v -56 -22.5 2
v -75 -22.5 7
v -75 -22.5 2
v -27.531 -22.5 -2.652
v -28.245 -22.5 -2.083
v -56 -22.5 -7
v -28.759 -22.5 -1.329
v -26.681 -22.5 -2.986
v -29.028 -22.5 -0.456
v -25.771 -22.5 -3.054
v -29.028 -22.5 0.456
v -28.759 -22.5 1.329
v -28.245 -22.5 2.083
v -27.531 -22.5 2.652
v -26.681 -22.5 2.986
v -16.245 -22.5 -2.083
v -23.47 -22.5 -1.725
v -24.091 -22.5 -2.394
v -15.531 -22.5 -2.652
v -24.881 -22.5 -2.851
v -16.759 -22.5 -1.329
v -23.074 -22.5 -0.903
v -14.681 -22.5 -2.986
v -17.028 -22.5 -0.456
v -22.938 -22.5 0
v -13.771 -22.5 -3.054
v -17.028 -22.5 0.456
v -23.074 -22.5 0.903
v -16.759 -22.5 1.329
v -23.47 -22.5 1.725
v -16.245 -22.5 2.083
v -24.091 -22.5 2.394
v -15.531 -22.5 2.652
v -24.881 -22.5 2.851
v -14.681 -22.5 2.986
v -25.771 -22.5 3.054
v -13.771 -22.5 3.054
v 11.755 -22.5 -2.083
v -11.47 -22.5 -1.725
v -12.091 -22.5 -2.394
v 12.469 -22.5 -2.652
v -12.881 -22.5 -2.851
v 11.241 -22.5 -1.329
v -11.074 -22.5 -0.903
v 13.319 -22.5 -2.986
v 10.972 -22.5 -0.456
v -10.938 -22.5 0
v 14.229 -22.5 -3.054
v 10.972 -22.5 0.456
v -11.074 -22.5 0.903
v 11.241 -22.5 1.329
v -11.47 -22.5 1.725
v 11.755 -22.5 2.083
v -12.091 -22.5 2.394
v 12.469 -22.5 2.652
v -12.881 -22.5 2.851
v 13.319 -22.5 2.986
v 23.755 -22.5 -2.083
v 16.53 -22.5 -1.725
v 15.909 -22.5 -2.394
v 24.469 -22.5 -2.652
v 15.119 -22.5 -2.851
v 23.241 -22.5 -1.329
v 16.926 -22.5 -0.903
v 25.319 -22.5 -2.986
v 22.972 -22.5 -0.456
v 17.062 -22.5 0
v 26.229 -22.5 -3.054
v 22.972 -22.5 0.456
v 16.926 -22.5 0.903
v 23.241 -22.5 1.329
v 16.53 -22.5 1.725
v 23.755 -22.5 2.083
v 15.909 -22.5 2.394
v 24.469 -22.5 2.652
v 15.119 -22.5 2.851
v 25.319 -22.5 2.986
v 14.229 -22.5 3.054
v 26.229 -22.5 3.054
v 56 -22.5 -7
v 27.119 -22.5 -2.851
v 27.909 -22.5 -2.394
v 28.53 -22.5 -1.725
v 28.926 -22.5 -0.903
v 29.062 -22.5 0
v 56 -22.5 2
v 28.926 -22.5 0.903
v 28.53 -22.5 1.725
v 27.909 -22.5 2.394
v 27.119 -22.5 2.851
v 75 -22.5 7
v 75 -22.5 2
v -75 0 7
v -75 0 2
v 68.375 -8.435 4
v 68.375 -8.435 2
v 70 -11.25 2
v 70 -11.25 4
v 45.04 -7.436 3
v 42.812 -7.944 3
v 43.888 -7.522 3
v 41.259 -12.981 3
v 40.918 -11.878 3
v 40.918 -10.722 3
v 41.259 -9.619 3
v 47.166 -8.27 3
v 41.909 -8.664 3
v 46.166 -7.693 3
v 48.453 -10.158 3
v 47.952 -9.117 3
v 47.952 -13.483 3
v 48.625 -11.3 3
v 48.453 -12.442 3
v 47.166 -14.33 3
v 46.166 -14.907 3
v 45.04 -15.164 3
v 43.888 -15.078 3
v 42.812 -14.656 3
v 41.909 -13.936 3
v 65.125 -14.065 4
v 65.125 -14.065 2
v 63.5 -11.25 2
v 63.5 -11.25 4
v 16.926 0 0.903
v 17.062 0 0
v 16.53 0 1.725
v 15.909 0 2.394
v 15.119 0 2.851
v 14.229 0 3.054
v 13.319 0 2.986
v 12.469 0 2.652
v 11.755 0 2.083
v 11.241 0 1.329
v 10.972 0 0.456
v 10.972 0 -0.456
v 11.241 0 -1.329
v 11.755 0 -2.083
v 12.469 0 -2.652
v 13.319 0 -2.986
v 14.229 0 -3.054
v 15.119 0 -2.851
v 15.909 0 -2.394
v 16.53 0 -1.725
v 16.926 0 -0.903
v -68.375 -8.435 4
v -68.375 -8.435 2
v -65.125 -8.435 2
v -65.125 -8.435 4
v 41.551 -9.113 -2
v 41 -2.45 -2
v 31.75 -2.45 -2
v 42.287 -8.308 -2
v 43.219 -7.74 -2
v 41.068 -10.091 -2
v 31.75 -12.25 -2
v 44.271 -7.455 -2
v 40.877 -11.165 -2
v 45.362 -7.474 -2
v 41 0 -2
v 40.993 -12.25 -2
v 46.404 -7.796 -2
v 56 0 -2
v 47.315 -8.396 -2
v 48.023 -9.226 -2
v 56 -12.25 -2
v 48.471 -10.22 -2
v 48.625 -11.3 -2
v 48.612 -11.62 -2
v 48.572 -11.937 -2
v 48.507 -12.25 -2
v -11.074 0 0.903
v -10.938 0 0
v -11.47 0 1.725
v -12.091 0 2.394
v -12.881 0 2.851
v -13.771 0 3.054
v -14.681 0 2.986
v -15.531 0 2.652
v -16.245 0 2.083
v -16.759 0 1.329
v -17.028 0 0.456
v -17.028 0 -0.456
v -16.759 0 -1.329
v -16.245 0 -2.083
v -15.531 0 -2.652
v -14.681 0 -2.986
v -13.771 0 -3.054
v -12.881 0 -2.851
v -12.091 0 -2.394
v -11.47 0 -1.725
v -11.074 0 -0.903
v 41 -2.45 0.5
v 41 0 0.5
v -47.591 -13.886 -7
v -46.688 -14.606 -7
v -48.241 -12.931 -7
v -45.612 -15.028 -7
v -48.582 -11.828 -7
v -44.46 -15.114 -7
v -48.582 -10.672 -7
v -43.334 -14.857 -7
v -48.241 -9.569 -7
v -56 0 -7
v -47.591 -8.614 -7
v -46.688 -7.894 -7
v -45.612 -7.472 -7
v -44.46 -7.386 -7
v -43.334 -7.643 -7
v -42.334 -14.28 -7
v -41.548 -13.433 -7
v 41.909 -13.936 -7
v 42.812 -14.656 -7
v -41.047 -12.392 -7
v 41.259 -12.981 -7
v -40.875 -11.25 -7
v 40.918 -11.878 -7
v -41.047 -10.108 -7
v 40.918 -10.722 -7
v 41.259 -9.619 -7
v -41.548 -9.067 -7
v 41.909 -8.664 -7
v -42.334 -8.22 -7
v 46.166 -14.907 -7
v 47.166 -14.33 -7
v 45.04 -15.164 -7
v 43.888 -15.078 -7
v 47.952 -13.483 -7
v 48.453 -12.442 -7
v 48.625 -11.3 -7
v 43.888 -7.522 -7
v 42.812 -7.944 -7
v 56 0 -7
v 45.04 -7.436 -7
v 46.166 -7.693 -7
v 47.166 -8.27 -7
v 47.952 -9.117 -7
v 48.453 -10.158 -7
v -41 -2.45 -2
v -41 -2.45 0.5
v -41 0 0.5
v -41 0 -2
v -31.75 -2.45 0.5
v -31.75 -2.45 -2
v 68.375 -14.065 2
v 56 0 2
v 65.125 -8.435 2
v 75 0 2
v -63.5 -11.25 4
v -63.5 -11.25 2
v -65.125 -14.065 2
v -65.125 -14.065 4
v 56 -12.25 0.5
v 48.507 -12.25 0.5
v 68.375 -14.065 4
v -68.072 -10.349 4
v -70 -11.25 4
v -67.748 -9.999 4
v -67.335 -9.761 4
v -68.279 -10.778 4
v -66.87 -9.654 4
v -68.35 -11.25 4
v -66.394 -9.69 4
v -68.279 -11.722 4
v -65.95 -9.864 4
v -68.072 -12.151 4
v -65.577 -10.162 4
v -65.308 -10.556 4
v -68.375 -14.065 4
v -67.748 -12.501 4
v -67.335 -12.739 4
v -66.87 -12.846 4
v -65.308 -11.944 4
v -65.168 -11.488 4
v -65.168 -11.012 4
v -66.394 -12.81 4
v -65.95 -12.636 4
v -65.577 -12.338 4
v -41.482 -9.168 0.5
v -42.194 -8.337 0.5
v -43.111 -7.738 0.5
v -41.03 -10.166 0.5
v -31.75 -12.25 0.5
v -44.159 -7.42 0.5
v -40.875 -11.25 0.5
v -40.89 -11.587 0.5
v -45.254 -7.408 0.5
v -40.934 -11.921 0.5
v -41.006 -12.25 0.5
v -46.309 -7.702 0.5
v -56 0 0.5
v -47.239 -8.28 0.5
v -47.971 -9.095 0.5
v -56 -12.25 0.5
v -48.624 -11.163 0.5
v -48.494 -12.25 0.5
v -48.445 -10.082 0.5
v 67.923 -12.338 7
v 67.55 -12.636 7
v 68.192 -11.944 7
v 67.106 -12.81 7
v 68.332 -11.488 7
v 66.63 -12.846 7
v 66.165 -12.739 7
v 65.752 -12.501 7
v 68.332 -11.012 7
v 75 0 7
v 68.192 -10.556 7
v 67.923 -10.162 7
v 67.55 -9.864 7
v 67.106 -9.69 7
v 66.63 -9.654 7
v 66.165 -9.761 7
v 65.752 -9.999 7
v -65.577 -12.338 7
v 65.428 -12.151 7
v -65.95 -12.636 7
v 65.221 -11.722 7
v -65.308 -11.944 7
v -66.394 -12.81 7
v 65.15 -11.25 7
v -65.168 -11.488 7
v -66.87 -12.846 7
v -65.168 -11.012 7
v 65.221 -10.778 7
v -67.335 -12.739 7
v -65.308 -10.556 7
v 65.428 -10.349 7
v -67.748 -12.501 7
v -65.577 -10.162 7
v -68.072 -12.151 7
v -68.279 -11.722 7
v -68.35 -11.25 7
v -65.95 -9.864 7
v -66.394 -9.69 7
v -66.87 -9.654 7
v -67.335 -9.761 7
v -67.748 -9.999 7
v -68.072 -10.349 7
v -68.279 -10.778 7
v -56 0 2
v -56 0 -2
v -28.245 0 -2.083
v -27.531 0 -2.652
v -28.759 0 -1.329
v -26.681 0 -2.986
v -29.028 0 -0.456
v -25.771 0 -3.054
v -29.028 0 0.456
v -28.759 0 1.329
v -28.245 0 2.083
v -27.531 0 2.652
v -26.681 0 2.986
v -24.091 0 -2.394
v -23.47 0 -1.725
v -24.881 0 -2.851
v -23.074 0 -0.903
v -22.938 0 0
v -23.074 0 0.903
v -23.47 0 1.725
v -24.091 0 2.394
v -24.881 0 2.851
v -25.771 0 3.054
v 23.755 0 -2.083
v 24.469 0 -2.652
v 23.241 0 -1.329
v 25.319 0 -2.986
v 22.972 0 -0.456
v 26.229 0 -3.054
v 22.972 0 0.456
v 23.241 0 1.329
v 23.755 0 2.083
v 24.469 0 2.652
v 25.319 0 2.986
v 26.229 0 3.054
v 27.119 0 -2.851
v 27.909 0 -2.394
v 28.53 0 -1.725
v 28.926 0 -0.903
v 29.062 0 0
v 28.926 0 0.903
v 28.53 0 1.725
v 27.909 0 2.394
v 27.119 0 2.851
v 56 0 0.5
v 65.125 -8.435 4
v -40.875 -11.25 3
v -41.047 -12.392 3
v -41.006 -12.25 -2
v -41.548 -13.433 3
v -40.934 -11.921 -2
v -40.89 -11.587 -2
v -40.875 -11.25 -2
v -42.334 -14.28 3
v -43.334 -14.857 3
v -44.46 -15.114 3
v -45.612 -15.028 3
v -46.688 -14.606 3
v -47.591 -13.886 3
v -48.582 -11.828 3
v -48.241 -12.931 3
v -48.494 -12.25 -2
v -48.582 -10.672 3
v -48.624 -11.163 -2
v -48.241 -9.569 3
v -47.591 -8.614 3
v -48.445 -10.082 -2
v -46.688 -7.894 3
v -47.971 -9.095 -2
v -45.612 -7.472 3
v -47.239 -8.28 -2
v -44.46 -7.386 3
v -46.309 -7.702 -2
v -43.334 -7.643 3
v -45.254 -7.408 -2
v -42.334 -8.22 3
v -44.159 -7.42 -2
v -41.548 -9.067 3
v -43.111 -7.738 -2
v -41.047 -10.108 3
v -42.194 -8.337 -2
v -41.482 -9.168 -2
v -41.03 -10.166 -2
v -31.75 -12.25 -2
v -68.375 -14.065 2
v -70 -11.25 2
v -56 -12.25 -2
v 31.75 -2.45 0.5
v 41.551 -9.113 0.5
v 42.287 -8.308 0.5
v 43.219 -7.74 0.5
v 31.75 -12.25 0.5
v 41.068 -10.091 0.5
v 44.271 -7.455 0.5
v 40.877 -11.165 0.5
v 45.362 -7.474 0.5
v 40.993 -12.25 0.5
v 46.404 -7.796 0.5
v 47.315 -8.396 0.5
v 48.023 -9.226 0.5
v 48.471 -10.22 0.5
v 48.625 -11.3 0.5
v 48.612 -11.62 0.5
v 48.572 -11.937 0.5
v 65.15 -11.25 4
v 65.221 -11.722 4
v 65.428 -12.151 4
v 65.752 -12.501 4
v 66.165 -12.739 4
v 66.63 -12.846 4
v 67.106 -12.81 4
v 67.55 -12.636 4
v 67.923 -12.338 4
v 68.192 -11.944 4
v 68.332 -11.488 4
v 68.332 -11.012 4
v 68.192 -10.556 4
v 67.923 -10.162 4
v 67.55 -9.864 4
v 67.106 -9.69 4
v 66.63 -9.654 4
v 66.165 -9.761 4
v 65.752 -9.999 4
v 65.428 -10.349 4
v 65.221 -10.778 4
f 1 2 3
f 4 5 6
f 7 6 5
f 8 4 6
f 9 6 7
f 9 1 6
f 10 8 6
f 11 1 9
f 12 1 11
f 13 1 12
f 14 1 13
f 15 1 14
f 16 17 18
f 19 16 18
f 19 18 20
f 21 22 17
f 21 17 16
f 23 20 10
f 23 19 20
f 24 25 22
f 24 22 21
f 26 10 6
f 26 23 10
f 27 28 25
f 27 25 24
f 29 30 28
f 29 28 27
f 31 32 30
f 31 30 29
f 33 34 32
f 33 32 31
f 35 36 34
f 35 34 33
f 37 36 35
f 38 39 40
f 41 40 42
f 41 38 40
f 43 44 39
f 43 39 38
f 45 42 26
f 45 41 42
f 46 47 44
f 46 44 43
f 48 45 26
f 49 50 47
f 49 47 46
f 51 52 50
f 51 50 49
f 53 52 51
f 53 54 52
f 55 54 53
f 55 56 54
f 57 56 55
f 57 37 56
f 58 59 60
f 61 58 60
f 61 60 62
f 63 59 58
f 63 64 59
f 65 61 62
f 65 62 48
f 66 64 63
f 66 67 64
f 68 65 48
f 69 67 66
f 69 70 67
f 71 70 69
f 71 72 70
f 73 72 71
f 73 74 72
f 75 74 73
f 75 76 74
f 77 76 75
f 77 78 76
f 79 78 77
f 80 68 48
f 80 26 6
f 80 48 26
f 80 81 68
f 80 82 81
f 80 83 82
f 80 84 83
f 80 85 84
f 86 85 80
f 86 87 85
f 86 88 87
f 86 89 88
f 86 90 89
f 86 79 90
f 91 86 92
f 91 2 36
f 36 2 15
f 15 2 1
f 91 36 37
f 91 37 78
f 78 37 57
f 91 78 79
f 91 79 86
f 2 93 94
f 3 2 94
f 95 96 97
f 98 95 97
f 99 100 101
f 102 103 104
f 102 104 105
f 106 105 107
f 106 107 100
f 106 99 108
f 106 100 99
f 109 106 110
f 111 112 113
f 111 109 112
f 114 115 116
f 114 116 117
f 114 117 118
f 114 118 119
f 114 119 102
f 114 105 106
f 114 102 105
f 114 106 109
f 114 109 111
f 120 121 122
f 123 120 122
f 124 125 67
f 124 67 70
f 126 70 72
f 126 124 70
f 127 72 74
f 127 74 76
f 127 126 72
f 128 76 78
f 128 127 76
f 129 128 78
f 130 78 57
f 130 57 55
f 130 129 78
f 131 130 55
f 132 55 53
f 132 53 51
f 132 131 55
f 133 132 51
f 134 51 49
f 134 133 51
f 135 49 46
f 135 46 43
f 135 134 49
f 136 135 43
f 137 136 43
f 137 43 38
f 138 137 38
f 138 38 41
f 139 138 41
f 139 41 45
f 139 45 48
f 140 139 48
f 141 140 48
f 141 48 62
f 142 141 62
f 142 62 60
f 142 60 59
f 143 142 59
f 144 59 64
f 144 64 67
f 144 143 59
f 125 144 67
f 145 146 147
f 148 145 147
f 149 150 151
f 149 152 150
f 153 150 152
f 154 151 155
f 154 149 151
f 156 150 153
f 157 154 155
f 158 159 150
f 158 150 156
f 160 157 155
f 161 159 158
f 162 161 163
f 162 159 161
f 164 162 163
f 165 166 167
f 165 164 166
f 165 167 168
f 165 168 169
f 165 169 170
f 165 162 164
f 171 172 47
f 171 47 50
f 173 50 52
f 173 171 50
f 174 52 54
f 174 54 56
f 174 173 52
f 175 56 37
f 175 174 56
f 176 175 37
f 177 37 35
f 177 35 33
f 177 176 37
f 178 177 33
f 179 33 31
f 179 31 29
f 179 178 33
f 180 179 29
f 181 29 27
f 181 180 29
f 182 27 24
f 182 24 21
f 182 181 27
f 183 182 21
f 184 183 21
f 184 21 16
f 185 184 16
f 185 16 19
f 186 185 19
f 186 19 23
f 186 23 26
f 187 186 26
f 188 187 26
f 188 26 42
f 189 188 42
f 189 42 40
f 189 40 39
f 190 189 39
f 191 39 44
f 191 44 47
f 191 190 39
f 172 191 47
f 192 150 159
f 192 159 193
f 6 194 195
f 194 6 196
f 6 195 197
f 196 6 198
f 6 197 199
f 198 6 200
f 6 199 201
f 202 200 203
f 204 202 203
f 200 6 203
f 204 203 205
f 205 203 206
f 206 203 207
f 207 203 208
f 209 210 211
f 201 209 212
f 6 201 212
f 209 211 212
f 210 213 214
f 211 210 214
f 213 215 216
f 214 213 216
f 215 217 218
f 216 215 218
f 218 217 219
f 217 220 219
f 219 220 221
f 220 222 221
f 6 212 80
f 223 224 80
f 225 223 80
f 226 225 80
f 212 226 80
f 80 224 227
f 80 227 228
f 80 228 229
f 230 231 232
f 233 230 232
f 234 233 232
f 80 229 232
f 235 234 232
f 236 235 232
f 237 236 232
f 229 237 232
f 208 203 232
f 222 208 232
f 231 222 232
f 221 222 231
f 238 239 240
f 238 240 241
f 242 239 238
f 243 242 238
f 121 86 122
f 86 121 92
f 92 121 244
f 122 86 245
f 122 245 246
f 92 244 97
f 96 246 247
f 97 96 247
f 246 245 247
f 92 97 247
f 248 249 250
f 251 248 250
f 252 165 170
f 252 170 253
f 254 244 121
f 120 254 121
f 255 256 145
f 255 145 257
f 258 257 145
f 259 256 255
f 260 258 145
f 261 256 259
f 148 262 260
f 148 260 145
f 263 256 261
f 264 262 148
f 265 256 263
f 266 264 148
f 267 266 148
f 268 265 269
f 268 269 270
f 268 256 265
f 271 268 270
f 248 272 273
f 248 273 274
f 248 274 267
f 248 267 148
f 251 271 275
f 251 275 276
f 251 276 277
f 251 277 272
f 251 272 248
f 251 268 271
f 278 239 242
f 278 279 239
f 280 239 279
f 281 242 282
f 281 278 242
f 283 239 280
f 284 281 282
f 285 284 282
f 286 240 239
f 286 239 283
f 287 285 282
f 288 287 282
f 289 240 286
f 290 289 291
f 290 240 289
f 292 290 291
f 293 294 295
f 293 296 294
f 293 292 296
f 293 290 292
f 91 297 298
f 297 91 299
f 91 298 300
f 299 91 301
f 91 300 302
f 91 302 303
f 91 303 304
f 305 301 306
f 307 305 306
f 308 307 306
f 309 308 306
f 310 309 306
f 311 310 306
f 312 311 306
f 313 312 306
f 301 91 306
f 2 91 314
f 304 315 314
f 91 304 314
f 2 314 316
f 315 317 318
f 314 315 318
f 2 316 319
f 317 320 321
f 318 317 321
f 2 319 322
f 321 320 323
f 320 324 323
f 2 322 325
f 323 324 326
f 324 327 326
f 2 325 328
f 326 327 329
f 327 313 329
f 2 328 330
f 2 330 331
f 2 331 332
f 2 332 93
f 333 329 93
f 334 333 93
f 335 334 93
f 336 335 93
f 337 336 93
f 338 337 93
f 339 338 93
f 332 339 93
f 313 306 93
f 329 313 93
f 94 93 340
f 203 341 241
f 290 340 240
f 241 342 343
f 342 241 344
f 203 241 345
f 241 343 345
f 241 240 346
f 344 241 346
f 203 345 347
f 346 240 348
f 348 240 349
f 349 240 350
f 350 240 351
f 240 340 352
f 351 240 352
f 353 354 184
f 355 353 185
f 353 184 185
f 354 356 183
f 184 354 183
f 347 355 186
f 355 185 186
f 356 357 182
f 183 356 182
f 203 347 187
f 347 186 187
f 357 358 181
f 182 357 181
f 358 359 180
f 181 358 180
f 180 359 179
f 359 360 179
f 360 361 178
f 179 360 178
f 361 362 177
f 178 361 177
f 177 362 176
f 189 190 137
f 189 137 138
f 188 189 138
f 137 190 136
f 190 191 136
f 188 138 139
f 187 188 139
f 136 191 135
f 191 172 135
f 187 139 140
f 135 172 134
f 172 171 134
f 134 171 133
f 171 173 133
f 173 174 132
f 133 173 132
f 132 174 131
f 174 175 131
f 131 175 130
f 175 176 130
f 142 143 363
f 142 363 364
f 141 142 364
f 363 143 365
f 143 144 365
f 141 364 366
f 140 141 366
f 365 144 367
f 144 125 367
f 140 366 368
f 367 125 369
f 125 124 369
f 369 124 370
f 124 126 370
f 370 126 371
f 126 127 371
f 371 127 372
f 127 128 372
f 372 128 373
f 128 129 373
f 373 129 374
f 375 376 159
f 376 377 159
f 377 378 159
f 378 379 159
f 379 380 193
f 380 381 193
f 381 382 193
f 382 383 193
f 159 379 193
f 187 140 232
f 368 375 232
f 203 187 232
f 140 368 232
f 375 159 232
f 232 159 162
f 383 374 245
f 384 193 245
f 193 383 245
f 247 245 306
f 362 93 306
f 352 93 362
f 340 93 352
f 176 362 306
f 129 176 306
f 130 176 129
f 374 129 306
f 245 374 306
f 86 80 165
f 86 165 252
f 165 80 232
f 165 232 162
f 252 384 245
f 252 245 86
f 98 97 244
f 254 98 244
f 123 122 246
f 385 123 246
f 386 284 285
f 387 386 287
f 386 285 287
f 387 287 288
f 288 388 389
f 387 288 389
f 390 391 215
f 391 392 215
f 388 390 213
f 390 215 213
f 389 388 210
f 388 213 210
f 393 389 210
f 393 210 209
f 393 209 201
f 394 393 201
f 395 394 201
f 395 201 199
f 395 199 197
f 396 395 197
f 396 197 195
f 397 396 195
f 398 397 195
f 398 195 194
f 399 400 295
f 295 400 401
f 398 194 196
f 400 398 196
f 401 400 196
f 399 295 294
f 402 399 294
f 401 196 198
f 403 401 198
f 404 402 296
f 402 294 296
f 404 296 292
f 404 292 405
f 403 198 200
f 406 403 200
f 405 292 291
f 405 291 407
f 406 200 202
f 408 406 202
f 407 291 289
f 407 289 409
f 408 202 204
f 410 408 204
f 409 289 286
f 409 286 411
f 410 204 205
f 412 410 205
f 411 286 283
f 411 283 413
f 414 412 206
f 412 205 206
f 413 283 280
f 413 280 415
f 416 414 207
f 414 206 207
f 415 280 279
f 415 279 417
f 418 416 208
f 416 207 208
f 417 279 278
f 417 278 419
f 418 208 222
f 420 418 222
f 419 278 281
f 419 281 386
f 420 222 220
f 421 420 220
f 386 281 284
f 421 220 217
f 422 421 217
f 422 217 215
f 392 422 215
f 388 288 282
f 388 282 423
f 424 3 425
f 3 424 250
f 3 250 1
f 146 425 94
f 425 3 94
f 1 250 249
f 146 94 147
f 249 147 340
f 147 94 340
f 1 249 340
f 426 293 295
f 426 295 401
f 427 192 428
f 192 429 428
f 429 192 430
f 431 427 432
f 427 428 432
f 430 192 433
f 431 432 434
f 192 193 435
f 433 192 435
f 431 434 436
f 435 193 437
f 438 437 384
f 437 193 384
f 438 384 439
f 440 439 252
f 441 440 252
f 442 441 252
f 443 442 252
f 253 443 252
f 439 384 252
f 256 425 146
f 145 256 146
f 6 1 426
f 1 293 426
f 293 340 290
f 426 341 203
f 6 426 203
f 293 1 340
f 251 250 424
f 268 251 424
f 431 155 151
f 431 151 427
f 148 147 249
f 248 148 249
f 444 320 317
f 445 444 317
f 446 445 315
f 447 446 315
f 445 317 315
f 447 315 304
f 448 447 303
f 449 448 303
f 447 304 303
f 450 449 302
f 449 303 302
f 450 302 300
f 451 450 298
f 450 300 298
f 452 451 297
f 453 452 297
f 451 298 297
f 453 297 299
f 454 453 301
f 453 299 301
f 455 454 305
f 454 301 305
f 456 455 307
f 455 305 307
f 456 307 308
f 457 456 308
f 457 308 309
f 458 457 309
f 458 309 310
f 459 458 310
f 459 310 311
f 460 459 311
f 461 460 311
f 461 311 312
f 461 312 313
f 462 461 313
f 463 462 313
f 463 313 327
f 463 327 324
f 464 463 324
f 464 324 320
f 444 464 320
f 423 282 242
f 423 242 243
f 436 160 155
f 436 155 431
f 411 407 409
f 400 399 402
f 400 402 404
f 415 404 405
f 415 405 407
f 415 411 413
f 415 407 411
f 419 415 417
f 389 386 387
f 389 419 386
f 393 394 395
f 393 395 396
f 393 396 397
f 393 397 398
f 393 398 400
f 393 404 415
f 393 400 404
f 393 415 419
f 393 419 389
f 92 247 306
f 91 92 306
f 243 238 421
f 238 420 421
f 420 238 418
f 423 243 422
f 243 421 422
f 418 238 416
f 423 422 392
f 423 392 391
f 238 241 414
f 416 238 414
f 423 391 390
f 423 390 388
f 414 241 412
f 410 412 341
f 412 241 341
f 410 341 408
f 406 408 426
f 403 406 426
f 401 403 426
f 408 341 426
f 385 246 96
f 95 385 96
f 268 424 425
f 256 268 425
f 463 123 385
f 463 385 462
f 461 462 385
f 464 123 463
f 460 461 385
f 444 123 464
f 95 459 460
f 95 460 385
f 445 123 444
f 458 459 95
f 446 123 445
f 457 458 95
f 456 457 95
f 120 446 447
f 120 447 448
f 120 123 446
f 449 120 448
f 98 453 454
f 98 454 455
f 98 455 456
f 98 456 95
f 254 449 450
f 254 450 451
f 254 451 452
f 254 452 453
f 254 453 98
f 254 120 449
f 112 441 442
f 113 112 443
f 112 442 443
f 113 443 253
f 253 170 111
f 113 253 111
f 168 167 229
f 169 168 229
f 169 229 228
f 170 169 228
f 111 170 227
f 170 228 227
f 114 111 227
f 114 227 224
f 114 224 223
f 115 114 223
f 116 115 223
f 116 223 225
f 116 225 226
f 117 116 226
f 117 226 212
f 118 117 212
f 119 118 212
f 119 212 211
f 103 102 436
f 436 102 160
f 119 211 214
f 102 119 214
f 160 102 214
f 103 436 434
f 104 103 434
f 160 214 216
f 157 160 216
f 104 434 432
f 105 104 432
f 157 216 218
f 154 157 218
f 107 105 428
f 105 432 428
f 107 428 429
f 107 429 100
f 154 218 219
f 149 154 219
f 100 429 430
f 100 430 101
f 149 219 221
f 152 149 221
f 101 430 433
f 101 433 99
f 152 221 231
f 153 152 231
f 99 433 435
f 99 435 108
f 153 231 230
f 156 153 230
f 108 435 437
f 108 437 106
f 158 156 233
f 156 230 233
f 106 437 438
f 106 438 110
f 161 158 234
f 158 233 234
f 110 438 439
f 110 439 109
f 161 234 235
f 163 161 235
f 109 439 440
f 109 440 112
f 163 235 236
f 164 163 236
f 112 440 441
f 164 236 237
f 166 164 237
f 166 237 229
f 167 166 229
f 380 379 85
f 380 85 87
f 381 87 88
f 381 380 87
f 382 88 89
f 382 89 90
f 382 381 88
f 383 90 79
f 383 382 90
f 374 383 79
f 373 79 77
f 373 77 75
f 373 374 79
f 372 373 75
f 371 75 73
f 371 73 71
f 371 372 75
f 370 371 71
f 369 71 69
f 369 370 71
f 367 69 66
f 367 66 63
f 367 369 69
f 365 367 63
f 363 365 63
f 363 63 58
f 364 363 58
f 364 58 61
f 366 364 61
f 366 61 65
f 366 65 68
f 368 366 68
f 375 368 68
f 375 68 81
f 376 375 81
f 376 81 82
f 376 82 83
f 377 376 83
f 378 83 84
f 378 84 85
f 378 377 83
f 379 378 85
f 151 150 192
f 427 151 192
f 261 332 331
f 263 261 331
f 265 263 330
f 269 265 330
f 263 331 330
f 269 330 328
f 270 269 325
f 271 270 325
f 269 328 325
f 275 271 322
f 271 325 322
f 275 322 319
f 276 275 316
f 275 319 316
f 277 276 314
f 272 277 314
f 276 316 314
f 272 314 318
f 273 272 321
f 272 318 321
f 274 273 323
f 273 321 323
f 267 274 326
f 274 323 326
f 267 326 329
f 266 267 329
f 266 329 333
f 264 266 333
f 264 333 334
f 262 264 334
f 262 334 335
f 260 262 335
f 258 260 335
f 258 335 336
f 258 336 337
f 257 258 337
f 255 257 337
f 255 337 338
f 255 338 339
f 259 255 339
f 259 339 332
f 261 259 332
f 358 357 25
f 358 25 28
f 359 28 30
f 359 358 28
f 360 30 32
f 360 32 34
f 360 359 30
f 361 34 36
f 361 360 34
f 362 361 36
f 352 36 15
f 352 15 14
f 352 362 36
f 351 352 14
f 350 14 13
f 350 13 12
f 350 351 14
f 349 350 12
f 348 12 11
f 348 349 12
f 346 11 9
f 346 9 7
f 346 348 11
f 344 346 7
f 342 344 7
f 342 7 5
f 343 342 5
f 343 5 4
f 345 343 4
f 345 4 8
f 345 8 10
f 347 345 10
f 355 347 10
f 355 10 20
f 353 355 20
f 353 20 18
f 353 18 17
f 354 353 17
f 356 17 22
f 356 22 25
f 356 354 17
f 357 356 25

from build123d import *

# Parameters (mm, degrees)
SKETCH016_R     = 3.0625
PAD003_DEPTH    = 22.5
SKETCH020_R     = 3.875
POCKET012_DEPTH = 10
SKETCH025_W     = 2.5
SKETCH025_H     = 12.25
POCKET013_DEPTH = 15
SKETCH026_W     = 2.5
SKETCH026_H     = 9.8
POCKET014_DEPTH = 9.25
SKETCH027_W     = 2.5
SKETCH027_H     = 12.25
POCKET015_DEPTH = 15
SKETCH028_W     = 2.5
SKETCH028_H     = 9.8
POCKET016_DEPTH = 9.25
SKETCH029_R     = 1.6
POCKET017_DEPTH = 5
POCKET018_DEPTH = 2


with BuildPart() as part:
    # Sketch016 → Pad003 (new body)
    with BuildSketch(Plane.XZ):
        Polygon((-56, -7), (56, -7), (56, 2), (75, 2), (75, 7), (-75, 7), (-75, 2), (-56, 2), align=None)
        with Locations((-14, 0)):
            Circle(SKETCH016_R, mode=Mode.SUBTRACT)
        with Locations((14, 0)):
            Circle(SKETCH016_R, mode=Mode.SUBTRACT)
        with Locations((-26, 0)):
            Circle(SKETCH016_R, mode=Mode.SUBTRACT)
        with Locations((26, 0)):
            Circle(SKETCH016_R, mode=Mode.SUBTRACT)
    extrude(amount=PAD003_DEPTH)

    # Sketch020 (on Face4 of Pad003) → Pocket012 (cut)
    with BuildSketch(Plane(origin=(0, 0, -7), x_dir=(1, 0, 0), z_dir=(0, 0, -1))):
        with Locations((-44.75, 11.25)):
            Circle(SKETCH020_R)
        with Locations((44.75, 11.3)):
            Circle(SKETCH020_R)
    extrude(amount=-POCKET012_DEPTH, mode=Mode.SUBTRACT)

    # Sketch025 (on Face9 of Pocket012) → Pocket013 (cut)
    with BuildSketch(Plane(origin=(56, 0, 0), x_dir=(0, 0, 1), z_dir=(1, 0, 0))):
        with Locations((-0.75, 6.125)):
            Rectangle(SKETCH025_W, SKETCH025_H)
    extrude(amount=-POCKET013_DEPTH, mode=Mode.SUBTRACT)

    # Sketch026 (on Face11 of Pocket013) → Pocket014 (cut)
    with BuildSketch(Plane(origin=(41, 0, 0), x_dir=(0, 0, 1), z_dir=(1, 0, 0))):
        with Locations((-0.75, 7.35)):
            Rectangle(SKETCH026_W, SKETCH026_H)
    extrude(amount=-POCKET014_DEPTH, mode=Mode.SUBTRACT)

    # Sketch027 (on Face7 of Pocket012) → Pocket015 (cut)
    with BuildSketch(Plane(origin=(-56, 0, 0), x_dir=(0, 0, -1), z_dir=(-1, 0, 0))):
        with Locations((0.75, 6.125)):
            Rectangle(SKETCH027_W, SKETCH027_H)
    extrude(amount=-POCKET015_DEPTH, mode=Mode.SUBTRACT)

    # Sketch028 (on Face9 of Pocket015) → Pocket016 (cut)
    with BuildSketch(Plane(origin=(-41, 0, 0), x_dir=(0, 0, -1), z_dir=(-1, 0, 0))):
        with Locations((0.75, 7.35)):
            Rectangle(SKETCH028_W, SKETCH028_H)
    extrude(amount=-POCKET016_DEPTH, mode=Mode.SUBTRACT)

    # Sketch029 (on Face2 of Pocket016) → Pocket017 (cut)
    with BuildSketch(Plane(origin=(0, 0, 7), x_dir=(-1, 0, 0), z_dir=(0, 0, 1))):
        with Locations((-66.75, 11.25)):
            Circle(SKETCH029_R)
        with Locations((66.75, 11.25)):
            Circle(SKETCH029_R)
    extrude(amount=-POCKET017_DEPTH, mode=Mode.SUBTRACT)

    # Sketch030 (on Face18 of Pocket017) → Pocket018 (cut)
    with BuildSketch(Plane(origin=(0, 0, 2), x_dir=(1, 0, 0), z_dir=(0, 0, -1))):
        Polygon((-65.125, 8.4354174377), (-63.5, 11.25), (-65.125, 14.0645825623), (-68.375, 14.0645825623), (-70, 11.25), (-68.375, 8.4354174377), align=None)
        Polygon((68.375, 8.4354174377), (70, 11.25), (68.375, 14.0645825623), (65.125, 14.0645825623), (63.5, 11.25), (65.125, 8.4354174377), align=None)
    extrude(amount=-POCKET018_DEPTH, mode=Mode.SUBTRACT)


solid = part.part
